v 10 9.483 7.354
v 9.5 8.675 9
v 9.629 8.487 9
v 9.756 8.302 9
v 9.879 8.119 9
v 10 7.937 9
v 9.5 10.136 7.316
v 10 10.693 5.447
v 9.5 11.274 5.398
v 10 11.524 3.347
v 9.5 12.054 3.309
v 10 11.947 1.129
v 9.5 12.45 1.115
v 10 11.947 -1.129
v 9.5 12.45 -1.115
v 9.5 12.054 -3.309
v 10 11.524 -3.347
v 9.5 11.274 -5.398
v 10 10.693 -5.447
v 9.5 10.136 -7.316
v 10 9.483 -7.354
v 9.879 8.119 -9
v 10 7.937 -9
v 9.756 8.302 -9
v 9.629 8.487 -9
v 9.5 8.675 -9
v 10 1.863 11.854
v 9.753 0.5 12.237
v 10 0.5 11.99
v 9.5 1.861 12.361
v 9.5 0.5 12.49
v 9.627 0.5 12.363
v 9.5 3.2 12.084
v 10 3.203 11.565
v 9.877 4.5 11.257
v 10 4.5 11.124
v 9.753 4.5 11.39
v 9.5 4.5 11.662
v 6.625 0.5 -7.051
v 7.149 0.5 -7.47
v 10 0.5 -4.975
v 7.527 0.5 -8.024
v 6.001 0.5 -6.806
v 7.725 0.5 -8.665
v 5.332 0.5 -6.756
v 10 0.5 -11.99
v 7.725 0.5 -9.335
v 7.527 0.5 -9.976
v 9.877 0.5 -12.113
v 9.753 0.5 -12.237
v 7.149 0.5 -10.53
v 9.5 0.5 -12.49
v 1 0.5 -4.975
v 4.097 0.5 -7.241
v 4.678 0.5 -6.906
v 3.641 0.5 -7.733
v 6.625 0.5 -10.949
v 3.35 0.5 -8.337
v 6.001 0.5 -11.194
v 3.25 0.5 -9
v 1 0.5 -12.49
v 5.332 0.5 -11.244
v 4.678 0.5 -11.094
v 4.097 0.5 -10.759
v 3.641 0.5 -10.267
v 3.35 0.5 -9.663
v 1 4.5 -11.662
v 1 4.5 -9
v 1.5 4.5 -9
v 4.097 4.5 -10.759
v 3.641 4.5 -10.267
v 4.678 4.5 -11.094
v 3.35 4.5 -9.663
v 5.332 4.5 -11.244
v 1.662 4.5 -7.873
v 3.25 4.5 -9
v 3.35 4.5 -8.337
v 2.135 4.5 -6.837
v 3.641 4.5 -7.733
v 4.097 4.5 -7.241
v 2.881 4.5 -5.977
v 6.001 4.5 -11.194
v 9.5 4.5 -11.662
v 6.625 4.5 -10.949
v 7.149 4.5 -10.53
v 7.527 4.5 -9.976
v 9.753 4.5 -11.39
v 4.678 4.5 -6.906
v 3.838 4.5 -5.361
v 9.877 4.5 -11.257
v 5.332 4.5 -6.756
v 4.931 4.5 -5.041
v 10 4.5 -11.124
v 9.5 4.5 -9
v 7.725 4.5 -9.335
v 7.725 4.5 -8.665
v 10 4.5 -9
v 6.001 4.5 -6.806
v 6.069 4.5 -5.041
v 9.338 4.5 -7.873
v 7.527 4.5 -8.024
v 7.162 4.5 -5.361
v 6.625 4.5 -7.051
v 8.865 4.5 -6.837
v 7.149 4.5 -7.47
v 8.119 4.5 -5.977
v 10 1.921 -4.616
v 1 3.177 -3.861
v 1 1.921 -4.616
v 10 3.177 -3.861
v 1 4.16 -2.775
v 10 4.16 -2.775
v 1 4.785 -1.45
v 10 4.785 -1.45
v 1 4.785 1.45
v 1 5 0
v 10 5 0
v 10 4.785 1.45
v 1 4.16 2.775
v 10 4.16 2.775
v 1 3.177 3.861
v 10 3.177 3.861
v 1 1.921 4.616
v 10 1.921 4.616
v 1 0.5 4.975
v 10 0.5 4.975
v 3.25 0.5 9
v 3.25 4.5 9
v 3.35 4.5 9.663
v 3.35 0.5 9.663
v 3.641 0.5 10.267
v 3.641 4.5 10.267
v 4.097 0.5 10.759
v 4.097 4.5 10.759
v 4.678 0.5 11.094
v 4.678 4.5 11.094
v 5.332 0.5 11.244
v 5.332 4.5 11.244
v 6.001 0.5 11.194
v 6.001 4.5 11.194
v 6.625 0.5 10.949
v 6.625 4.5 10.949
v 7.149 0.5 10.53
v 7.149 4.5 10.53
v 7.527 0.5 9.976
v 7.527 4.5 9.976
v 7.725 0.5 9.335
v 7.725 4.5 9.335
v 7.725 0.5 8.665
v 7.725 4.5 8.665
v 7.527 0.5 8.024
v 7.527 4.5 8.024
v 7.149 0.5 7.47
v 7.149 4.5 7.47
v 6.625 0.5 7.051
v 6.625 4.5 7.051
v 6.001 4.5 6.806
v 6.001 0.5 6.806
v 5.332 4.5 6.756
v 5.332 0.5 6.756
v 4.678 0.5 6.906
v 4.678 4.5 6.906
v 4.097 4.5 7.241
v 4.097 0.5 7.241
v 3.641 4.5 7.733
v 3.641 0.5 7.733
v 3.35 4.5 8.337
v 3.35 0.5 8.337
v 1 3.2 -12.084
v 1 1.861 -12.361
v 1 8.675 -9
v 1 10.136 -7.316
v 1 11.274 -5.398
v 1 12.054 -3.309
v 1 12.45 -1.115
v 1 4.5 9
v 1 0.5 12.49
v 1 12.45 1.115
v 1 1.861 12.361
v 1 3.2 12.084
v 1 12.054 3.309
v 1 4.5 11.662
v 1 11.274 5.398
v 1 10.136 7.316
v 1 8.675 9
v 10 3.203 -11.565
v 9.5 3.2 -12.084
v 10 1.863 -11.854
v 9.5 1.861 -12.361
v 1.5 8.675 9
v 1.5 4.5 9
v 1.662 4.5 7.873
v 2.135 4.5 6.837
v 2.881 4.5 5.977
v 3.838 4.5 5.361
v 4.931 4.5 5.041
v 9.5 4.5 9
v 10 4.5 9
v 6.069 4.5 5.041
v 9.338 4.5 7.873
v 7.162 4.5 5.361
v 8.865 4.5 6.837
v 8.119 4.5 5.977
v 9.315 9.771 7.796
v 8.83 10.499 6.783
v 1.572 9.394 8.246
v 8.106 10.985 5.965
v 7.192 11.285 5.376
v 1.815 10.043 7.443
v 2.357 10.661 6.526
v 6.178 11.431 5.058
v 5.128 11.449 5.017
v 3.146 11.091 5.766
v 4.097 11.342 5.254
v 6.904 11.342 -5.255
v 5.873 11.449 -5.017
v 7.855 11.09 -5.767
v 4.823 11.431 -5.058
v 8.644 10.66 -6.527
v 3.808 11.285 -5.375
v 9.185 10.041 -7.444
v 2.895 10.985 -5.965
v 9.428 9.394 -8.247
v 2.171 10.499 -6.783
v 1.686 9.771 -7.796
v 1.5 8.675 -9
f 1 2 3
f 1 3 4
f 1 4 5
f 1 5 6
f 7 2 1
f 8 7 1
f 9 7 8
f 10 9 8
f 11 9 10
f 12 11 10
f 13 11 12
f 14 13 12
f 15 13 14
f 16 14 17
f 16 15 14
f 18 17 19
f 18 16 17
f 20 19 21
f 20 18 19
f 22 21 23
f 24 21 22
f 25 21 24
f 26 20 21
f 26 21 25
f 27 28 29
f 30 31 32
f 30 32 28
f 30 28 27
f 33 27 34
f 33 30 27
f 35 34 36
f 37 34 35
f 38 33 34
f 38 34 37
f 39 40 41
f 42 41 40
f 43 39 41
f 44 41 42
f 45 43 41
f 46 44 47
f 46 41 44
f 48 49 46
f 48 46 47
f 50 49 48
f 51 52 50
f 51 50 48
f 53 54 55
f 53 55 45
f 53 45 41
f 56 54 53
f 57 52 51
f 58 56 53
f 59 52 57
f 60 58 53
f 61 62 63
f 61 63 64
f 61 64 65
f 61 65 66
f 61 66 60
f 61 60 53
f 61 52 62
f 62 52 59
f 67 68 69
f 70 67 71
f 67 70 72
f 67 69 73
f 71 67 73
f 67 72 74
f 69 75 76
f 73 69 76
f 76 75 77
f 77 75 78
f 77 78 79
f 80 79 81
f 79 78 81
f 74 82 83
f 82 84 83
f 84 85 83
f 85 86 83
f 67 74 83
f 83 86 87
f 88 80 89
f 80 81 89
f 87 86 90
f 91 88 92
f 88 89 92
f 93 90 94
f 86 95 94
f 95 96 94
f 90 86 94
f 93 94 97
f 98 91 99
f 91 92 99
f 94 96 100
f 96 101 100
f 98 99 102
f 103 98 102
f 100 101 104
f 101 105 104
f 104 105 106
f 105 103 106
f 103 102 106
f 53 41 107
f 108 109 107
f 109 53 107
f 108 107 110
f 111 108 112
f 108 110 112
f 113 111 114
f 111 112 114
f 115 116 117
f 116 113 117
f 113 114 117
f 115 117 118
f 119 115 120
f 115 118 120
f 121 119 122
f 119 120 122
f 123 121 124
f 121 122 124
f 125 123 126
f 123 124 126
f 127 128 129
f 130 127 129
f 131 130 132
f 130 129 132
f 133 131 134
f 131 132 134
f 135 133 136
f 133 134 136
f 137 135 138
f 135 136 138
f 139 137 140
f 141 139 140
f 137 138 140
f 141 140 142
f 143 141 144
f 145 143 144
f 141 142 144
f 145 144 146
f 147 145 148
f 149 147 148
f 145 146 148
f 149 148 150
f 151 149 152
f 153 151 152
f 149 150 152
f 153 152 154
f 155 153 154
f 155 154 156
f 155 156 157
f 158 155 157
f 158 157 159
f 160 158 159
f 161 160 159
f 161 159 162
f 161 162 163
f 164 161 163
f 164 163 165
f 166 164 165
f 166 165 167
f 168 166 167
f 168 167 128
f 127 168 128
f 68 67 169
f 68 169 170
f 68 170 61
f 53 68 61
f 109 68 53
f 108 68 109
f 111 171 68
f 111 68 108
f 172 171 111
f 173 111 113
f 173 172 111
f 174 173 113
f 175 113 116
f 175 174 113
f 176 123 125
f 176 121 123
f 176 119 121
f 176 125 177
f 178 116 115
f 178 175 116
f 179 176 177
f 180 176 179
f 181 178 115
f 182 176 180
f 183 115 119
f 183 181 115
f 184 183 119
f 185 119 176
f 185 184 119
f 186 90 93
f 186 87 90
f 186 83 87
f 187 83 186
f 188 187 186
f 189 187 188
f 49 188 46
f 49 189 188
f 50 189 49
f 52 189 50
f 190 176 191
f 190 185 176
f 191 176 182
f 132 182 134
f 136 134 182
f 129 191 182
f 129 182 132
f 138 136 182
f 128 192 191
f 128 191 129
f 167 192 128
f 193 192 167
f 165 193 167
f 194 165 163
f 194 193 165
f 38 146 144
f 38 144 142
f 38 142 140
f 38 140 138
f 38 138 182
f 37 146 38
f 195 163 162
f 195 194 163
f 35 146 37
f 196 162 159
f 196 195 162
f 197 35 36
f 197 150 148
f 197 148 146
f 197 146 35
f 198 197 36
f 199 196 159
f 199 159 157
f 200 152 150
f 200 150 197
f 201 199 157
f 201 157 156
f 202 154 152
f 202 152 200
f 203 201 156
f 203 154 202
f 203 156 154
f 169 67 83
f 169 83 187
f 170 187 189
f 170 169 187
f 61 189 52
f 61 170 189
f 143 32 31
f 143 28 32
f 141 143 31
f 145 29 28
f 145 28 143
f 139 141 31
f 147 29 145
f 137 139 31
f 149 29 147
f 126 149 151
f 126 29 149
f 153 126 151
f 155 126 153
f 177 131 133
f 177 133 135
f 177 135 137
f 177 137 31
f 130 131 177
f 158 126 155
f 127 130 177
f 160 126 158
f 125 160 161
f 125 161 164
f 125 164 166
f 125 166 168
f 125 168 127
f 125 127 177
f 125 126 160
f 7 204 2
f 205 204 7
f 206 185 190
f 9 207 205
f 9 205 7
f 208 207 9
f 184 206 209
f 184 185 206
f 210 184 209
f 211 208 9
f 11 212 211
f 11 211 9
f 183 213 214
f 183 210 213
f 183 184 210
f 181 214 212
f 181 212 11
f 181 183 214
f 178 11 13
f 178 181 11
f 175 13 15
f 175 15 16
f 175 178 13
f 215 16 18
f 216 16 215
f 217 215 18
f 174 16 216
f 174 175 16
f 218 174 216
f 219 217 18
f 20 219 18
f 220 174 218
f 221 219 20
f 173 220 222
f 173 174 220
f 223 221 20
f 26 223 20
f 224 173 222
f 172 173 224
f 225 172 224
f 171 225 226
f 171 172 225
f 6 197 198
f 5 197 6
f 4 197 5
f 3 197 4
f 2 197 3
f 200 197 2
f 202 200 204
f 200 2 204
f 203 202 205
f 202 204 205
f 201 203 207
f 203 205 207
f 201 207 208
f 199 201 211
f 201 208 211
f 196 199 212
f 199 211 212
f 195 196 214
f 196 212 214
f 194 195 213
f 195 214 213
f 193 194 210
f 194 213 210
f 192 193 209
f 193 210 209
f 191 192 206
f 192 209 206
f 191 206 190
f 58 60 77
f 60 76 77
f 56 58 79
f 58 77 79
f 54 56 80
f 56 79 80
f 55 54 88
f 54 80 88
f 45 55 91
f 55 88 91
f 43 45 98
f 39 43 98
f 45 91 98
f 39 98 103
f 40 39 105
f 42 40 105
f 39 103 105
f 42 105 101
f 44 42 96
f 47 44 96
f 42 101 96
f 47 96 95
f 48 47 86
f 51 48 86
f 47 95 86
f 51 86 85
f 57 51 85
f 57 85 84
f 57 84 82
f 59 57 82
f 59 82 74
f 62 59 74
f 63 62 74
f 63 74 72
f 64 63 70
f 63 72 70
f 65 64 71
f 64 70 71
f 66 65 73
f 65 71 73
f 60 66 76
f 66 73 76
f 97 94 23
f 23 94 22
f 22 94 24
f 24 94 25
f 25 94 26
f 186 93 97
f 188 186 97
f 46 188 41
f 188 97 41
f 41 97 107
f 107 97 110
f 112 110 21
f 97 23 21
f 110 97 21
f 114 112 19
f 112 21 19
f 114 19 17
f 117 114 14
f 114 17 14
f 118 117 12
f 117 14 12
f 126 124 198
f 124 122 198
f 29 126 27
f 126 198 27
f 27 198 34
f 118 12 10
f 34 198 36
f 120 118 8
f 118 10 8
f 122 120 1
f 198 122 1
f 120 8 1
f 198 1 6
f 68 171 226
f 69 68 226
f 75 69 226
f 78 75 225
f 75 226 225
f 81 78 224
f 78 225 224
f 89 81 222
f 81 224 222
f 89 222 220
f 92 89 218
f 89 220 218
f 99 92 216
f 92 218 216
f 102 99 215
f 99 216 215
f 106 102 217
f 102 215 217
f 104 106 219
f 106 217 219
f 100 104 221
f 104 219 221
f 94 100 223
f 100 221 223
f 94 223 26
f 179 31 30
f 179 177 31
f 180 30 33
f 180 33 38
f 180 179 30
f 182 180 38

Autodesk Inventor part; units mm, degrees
sketch "Sketch_1" plane through (0, 0, 0) normal (0, 0, 1) x (1, 0, 0)
  line L0 (10, 0) -> (0, 0)
  line L1 (1, 5) -> (10, 5)
  line L2 (10, 5) -> (10, 12)
  line L3 (10, 12) -> (9.5, 12.5)
  line L4 (9.5, 12.5) -> (1, 12.5)
  line L5 (1, 12.5) -> (1, 5)
revolve "Revolution1" add sketch "Sketch_1" angle 180 mid plane about axis through (10, 0, 0) along (-1, 0, 0)
sketch "Sketch_2" plane through (0, 0, 0) normal (0, 0, 1) x (1, 0, 0)
  line L0 (0, 0.5) -> (0, 0)
  line L1 (0, 0) -> (20, 0)
  line L2 (20, 0) -> (20, 0.5)
  line L3 (20, 0.5) -> (0, 0.5)
extrude "Extrusion1" cut sketch "Sketch_2" along normal mid plane 50
sketch "Sketch_3" plane through (0, 0, 9) normal (0, 0, 1) x (1, 0, 0)
  line L0 (5.5, 12.5) -> (5.5, 0)
  line L1 (5.5, 0) -> (3.25, 0)
  line L2 (3.25, 0) -> (3.25, 4.5)
  line L3 (3.25, 4.5) -> (1.5, 4.5)
  line L4 (1.5, 4.5) -> (1.5, 12.5)
  line L5 (1.5, 12.5) -> (5.5, 12.5)
  line L6 (5.5, 12.5) -> (5.5, 0)
revolve "Revolution2" cut sketch "Sketch_3" angle 360 about axis through (5.5, 12.5, 9) along (0, 1, 0)
sketch "Sketch_4" plane through (0, 0, -9) normal (0, 0, 1) x (1, 0, 0)
  line L0 (5.5, 12.5) -> (5.5, 0)
  line L1 (5.5, 0) -> (3.25, 0)
  line L2 (3.25, 0) -> (3.25, 4.5)
  line L3 (3.25, 4.5) -> (1.5, 4.5)
  line L4 (1.5, 4.5) -> (1.5, 12.5)
  line L5 (1.5, 12.5) -> (5.5, 12.5)
  line L6 (5.5, 12.5) -> (5.5, 0)
revolve "Revolution3" cut sketch "Sketch_4" angle 360 about axis through (5.5, 12.5, -9) along (0, 1, 0)
sketch "Sketch_5" plane through (0, 0, 9) normal (0, 0, 1) x (1, 0, 0)
  line L0 (0, 17) -> (0, 4.5)
  line L1 (0, 4.5) -> (20, 4.5)
  line L2 (20, 4.5) -> (20, 17)
  line L3 (20, 17) -> (0, 17)
extrude "Extrusion2" cut sketch "Sketch_5" along normal blind 25
sketch "Sketch_6" plane through (0, 0, -9) normal (0, 0, 1) x (1, 0, 0)
  line L0 (0, 17) -> (0, 4.5)
  line L1 (0, 4.5) -> (20, 4.5)
  line L2 (20, 4.5) -> (20, 17)
  line L3 (20, 17) -> (0, 17)
extrude "Extrusion3" cut sketch "Sketch_6" against normal blind 25
ref_plane "part2_to_part1_XY" through (0, 0, 0) normal (1, 0, 0) x (0, 0, -1)
ref_plane "part2_to_part1_YZ" through (0, 0, 0) normal (0, 0, -1) x (0, 1, 0)
ref_plane "part2_to_part1_ZX" through (0, 0, 0) normal (0, 1, 0) x (1, 0, 0)
ref_plane "part2_to_screw1_XY" through (5.5, 4.5, 9) normal (0, 1, 0) x (1, 0, 0)
ref_plane "part2_to_screw1_YZ" through (5.5, 4.5, 9) normal (1, 0, 0) x (0, 0, -1)
ref_plane "part2_to_screw1_ZX" through (5.5, 4.5, 9) normal (0, 0, -1) x (0, 1, 0)
ref_plane "part2_to_screw2_XY" through (5.5, 4.5, -9) normal (0, 1, 0) x (1, 0, 0)
ref_plane "part2_to_screw2_YZ" through (5.5, 4.5, -9) normal (1, 0, 0) x (0, 0, -1)
ref_plane "part2_to_screw2_ZX" through (5.5, 4.5, -9) normal (0, 0, -1) x (0, 1, 0)
properties part number "MBRAC45-2-10p2"
